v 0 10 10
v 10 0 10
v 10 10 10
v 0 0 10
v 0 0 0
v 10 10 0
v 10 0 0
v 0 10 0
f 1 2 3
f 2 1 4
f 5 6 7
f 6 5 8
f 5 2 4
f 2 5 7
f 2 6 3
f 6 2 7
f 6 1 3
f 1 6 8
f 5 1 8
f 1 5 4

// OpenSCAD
// Teste simples para verificar se o OpenSCAD funciona
cube([10, 10, 10]);
